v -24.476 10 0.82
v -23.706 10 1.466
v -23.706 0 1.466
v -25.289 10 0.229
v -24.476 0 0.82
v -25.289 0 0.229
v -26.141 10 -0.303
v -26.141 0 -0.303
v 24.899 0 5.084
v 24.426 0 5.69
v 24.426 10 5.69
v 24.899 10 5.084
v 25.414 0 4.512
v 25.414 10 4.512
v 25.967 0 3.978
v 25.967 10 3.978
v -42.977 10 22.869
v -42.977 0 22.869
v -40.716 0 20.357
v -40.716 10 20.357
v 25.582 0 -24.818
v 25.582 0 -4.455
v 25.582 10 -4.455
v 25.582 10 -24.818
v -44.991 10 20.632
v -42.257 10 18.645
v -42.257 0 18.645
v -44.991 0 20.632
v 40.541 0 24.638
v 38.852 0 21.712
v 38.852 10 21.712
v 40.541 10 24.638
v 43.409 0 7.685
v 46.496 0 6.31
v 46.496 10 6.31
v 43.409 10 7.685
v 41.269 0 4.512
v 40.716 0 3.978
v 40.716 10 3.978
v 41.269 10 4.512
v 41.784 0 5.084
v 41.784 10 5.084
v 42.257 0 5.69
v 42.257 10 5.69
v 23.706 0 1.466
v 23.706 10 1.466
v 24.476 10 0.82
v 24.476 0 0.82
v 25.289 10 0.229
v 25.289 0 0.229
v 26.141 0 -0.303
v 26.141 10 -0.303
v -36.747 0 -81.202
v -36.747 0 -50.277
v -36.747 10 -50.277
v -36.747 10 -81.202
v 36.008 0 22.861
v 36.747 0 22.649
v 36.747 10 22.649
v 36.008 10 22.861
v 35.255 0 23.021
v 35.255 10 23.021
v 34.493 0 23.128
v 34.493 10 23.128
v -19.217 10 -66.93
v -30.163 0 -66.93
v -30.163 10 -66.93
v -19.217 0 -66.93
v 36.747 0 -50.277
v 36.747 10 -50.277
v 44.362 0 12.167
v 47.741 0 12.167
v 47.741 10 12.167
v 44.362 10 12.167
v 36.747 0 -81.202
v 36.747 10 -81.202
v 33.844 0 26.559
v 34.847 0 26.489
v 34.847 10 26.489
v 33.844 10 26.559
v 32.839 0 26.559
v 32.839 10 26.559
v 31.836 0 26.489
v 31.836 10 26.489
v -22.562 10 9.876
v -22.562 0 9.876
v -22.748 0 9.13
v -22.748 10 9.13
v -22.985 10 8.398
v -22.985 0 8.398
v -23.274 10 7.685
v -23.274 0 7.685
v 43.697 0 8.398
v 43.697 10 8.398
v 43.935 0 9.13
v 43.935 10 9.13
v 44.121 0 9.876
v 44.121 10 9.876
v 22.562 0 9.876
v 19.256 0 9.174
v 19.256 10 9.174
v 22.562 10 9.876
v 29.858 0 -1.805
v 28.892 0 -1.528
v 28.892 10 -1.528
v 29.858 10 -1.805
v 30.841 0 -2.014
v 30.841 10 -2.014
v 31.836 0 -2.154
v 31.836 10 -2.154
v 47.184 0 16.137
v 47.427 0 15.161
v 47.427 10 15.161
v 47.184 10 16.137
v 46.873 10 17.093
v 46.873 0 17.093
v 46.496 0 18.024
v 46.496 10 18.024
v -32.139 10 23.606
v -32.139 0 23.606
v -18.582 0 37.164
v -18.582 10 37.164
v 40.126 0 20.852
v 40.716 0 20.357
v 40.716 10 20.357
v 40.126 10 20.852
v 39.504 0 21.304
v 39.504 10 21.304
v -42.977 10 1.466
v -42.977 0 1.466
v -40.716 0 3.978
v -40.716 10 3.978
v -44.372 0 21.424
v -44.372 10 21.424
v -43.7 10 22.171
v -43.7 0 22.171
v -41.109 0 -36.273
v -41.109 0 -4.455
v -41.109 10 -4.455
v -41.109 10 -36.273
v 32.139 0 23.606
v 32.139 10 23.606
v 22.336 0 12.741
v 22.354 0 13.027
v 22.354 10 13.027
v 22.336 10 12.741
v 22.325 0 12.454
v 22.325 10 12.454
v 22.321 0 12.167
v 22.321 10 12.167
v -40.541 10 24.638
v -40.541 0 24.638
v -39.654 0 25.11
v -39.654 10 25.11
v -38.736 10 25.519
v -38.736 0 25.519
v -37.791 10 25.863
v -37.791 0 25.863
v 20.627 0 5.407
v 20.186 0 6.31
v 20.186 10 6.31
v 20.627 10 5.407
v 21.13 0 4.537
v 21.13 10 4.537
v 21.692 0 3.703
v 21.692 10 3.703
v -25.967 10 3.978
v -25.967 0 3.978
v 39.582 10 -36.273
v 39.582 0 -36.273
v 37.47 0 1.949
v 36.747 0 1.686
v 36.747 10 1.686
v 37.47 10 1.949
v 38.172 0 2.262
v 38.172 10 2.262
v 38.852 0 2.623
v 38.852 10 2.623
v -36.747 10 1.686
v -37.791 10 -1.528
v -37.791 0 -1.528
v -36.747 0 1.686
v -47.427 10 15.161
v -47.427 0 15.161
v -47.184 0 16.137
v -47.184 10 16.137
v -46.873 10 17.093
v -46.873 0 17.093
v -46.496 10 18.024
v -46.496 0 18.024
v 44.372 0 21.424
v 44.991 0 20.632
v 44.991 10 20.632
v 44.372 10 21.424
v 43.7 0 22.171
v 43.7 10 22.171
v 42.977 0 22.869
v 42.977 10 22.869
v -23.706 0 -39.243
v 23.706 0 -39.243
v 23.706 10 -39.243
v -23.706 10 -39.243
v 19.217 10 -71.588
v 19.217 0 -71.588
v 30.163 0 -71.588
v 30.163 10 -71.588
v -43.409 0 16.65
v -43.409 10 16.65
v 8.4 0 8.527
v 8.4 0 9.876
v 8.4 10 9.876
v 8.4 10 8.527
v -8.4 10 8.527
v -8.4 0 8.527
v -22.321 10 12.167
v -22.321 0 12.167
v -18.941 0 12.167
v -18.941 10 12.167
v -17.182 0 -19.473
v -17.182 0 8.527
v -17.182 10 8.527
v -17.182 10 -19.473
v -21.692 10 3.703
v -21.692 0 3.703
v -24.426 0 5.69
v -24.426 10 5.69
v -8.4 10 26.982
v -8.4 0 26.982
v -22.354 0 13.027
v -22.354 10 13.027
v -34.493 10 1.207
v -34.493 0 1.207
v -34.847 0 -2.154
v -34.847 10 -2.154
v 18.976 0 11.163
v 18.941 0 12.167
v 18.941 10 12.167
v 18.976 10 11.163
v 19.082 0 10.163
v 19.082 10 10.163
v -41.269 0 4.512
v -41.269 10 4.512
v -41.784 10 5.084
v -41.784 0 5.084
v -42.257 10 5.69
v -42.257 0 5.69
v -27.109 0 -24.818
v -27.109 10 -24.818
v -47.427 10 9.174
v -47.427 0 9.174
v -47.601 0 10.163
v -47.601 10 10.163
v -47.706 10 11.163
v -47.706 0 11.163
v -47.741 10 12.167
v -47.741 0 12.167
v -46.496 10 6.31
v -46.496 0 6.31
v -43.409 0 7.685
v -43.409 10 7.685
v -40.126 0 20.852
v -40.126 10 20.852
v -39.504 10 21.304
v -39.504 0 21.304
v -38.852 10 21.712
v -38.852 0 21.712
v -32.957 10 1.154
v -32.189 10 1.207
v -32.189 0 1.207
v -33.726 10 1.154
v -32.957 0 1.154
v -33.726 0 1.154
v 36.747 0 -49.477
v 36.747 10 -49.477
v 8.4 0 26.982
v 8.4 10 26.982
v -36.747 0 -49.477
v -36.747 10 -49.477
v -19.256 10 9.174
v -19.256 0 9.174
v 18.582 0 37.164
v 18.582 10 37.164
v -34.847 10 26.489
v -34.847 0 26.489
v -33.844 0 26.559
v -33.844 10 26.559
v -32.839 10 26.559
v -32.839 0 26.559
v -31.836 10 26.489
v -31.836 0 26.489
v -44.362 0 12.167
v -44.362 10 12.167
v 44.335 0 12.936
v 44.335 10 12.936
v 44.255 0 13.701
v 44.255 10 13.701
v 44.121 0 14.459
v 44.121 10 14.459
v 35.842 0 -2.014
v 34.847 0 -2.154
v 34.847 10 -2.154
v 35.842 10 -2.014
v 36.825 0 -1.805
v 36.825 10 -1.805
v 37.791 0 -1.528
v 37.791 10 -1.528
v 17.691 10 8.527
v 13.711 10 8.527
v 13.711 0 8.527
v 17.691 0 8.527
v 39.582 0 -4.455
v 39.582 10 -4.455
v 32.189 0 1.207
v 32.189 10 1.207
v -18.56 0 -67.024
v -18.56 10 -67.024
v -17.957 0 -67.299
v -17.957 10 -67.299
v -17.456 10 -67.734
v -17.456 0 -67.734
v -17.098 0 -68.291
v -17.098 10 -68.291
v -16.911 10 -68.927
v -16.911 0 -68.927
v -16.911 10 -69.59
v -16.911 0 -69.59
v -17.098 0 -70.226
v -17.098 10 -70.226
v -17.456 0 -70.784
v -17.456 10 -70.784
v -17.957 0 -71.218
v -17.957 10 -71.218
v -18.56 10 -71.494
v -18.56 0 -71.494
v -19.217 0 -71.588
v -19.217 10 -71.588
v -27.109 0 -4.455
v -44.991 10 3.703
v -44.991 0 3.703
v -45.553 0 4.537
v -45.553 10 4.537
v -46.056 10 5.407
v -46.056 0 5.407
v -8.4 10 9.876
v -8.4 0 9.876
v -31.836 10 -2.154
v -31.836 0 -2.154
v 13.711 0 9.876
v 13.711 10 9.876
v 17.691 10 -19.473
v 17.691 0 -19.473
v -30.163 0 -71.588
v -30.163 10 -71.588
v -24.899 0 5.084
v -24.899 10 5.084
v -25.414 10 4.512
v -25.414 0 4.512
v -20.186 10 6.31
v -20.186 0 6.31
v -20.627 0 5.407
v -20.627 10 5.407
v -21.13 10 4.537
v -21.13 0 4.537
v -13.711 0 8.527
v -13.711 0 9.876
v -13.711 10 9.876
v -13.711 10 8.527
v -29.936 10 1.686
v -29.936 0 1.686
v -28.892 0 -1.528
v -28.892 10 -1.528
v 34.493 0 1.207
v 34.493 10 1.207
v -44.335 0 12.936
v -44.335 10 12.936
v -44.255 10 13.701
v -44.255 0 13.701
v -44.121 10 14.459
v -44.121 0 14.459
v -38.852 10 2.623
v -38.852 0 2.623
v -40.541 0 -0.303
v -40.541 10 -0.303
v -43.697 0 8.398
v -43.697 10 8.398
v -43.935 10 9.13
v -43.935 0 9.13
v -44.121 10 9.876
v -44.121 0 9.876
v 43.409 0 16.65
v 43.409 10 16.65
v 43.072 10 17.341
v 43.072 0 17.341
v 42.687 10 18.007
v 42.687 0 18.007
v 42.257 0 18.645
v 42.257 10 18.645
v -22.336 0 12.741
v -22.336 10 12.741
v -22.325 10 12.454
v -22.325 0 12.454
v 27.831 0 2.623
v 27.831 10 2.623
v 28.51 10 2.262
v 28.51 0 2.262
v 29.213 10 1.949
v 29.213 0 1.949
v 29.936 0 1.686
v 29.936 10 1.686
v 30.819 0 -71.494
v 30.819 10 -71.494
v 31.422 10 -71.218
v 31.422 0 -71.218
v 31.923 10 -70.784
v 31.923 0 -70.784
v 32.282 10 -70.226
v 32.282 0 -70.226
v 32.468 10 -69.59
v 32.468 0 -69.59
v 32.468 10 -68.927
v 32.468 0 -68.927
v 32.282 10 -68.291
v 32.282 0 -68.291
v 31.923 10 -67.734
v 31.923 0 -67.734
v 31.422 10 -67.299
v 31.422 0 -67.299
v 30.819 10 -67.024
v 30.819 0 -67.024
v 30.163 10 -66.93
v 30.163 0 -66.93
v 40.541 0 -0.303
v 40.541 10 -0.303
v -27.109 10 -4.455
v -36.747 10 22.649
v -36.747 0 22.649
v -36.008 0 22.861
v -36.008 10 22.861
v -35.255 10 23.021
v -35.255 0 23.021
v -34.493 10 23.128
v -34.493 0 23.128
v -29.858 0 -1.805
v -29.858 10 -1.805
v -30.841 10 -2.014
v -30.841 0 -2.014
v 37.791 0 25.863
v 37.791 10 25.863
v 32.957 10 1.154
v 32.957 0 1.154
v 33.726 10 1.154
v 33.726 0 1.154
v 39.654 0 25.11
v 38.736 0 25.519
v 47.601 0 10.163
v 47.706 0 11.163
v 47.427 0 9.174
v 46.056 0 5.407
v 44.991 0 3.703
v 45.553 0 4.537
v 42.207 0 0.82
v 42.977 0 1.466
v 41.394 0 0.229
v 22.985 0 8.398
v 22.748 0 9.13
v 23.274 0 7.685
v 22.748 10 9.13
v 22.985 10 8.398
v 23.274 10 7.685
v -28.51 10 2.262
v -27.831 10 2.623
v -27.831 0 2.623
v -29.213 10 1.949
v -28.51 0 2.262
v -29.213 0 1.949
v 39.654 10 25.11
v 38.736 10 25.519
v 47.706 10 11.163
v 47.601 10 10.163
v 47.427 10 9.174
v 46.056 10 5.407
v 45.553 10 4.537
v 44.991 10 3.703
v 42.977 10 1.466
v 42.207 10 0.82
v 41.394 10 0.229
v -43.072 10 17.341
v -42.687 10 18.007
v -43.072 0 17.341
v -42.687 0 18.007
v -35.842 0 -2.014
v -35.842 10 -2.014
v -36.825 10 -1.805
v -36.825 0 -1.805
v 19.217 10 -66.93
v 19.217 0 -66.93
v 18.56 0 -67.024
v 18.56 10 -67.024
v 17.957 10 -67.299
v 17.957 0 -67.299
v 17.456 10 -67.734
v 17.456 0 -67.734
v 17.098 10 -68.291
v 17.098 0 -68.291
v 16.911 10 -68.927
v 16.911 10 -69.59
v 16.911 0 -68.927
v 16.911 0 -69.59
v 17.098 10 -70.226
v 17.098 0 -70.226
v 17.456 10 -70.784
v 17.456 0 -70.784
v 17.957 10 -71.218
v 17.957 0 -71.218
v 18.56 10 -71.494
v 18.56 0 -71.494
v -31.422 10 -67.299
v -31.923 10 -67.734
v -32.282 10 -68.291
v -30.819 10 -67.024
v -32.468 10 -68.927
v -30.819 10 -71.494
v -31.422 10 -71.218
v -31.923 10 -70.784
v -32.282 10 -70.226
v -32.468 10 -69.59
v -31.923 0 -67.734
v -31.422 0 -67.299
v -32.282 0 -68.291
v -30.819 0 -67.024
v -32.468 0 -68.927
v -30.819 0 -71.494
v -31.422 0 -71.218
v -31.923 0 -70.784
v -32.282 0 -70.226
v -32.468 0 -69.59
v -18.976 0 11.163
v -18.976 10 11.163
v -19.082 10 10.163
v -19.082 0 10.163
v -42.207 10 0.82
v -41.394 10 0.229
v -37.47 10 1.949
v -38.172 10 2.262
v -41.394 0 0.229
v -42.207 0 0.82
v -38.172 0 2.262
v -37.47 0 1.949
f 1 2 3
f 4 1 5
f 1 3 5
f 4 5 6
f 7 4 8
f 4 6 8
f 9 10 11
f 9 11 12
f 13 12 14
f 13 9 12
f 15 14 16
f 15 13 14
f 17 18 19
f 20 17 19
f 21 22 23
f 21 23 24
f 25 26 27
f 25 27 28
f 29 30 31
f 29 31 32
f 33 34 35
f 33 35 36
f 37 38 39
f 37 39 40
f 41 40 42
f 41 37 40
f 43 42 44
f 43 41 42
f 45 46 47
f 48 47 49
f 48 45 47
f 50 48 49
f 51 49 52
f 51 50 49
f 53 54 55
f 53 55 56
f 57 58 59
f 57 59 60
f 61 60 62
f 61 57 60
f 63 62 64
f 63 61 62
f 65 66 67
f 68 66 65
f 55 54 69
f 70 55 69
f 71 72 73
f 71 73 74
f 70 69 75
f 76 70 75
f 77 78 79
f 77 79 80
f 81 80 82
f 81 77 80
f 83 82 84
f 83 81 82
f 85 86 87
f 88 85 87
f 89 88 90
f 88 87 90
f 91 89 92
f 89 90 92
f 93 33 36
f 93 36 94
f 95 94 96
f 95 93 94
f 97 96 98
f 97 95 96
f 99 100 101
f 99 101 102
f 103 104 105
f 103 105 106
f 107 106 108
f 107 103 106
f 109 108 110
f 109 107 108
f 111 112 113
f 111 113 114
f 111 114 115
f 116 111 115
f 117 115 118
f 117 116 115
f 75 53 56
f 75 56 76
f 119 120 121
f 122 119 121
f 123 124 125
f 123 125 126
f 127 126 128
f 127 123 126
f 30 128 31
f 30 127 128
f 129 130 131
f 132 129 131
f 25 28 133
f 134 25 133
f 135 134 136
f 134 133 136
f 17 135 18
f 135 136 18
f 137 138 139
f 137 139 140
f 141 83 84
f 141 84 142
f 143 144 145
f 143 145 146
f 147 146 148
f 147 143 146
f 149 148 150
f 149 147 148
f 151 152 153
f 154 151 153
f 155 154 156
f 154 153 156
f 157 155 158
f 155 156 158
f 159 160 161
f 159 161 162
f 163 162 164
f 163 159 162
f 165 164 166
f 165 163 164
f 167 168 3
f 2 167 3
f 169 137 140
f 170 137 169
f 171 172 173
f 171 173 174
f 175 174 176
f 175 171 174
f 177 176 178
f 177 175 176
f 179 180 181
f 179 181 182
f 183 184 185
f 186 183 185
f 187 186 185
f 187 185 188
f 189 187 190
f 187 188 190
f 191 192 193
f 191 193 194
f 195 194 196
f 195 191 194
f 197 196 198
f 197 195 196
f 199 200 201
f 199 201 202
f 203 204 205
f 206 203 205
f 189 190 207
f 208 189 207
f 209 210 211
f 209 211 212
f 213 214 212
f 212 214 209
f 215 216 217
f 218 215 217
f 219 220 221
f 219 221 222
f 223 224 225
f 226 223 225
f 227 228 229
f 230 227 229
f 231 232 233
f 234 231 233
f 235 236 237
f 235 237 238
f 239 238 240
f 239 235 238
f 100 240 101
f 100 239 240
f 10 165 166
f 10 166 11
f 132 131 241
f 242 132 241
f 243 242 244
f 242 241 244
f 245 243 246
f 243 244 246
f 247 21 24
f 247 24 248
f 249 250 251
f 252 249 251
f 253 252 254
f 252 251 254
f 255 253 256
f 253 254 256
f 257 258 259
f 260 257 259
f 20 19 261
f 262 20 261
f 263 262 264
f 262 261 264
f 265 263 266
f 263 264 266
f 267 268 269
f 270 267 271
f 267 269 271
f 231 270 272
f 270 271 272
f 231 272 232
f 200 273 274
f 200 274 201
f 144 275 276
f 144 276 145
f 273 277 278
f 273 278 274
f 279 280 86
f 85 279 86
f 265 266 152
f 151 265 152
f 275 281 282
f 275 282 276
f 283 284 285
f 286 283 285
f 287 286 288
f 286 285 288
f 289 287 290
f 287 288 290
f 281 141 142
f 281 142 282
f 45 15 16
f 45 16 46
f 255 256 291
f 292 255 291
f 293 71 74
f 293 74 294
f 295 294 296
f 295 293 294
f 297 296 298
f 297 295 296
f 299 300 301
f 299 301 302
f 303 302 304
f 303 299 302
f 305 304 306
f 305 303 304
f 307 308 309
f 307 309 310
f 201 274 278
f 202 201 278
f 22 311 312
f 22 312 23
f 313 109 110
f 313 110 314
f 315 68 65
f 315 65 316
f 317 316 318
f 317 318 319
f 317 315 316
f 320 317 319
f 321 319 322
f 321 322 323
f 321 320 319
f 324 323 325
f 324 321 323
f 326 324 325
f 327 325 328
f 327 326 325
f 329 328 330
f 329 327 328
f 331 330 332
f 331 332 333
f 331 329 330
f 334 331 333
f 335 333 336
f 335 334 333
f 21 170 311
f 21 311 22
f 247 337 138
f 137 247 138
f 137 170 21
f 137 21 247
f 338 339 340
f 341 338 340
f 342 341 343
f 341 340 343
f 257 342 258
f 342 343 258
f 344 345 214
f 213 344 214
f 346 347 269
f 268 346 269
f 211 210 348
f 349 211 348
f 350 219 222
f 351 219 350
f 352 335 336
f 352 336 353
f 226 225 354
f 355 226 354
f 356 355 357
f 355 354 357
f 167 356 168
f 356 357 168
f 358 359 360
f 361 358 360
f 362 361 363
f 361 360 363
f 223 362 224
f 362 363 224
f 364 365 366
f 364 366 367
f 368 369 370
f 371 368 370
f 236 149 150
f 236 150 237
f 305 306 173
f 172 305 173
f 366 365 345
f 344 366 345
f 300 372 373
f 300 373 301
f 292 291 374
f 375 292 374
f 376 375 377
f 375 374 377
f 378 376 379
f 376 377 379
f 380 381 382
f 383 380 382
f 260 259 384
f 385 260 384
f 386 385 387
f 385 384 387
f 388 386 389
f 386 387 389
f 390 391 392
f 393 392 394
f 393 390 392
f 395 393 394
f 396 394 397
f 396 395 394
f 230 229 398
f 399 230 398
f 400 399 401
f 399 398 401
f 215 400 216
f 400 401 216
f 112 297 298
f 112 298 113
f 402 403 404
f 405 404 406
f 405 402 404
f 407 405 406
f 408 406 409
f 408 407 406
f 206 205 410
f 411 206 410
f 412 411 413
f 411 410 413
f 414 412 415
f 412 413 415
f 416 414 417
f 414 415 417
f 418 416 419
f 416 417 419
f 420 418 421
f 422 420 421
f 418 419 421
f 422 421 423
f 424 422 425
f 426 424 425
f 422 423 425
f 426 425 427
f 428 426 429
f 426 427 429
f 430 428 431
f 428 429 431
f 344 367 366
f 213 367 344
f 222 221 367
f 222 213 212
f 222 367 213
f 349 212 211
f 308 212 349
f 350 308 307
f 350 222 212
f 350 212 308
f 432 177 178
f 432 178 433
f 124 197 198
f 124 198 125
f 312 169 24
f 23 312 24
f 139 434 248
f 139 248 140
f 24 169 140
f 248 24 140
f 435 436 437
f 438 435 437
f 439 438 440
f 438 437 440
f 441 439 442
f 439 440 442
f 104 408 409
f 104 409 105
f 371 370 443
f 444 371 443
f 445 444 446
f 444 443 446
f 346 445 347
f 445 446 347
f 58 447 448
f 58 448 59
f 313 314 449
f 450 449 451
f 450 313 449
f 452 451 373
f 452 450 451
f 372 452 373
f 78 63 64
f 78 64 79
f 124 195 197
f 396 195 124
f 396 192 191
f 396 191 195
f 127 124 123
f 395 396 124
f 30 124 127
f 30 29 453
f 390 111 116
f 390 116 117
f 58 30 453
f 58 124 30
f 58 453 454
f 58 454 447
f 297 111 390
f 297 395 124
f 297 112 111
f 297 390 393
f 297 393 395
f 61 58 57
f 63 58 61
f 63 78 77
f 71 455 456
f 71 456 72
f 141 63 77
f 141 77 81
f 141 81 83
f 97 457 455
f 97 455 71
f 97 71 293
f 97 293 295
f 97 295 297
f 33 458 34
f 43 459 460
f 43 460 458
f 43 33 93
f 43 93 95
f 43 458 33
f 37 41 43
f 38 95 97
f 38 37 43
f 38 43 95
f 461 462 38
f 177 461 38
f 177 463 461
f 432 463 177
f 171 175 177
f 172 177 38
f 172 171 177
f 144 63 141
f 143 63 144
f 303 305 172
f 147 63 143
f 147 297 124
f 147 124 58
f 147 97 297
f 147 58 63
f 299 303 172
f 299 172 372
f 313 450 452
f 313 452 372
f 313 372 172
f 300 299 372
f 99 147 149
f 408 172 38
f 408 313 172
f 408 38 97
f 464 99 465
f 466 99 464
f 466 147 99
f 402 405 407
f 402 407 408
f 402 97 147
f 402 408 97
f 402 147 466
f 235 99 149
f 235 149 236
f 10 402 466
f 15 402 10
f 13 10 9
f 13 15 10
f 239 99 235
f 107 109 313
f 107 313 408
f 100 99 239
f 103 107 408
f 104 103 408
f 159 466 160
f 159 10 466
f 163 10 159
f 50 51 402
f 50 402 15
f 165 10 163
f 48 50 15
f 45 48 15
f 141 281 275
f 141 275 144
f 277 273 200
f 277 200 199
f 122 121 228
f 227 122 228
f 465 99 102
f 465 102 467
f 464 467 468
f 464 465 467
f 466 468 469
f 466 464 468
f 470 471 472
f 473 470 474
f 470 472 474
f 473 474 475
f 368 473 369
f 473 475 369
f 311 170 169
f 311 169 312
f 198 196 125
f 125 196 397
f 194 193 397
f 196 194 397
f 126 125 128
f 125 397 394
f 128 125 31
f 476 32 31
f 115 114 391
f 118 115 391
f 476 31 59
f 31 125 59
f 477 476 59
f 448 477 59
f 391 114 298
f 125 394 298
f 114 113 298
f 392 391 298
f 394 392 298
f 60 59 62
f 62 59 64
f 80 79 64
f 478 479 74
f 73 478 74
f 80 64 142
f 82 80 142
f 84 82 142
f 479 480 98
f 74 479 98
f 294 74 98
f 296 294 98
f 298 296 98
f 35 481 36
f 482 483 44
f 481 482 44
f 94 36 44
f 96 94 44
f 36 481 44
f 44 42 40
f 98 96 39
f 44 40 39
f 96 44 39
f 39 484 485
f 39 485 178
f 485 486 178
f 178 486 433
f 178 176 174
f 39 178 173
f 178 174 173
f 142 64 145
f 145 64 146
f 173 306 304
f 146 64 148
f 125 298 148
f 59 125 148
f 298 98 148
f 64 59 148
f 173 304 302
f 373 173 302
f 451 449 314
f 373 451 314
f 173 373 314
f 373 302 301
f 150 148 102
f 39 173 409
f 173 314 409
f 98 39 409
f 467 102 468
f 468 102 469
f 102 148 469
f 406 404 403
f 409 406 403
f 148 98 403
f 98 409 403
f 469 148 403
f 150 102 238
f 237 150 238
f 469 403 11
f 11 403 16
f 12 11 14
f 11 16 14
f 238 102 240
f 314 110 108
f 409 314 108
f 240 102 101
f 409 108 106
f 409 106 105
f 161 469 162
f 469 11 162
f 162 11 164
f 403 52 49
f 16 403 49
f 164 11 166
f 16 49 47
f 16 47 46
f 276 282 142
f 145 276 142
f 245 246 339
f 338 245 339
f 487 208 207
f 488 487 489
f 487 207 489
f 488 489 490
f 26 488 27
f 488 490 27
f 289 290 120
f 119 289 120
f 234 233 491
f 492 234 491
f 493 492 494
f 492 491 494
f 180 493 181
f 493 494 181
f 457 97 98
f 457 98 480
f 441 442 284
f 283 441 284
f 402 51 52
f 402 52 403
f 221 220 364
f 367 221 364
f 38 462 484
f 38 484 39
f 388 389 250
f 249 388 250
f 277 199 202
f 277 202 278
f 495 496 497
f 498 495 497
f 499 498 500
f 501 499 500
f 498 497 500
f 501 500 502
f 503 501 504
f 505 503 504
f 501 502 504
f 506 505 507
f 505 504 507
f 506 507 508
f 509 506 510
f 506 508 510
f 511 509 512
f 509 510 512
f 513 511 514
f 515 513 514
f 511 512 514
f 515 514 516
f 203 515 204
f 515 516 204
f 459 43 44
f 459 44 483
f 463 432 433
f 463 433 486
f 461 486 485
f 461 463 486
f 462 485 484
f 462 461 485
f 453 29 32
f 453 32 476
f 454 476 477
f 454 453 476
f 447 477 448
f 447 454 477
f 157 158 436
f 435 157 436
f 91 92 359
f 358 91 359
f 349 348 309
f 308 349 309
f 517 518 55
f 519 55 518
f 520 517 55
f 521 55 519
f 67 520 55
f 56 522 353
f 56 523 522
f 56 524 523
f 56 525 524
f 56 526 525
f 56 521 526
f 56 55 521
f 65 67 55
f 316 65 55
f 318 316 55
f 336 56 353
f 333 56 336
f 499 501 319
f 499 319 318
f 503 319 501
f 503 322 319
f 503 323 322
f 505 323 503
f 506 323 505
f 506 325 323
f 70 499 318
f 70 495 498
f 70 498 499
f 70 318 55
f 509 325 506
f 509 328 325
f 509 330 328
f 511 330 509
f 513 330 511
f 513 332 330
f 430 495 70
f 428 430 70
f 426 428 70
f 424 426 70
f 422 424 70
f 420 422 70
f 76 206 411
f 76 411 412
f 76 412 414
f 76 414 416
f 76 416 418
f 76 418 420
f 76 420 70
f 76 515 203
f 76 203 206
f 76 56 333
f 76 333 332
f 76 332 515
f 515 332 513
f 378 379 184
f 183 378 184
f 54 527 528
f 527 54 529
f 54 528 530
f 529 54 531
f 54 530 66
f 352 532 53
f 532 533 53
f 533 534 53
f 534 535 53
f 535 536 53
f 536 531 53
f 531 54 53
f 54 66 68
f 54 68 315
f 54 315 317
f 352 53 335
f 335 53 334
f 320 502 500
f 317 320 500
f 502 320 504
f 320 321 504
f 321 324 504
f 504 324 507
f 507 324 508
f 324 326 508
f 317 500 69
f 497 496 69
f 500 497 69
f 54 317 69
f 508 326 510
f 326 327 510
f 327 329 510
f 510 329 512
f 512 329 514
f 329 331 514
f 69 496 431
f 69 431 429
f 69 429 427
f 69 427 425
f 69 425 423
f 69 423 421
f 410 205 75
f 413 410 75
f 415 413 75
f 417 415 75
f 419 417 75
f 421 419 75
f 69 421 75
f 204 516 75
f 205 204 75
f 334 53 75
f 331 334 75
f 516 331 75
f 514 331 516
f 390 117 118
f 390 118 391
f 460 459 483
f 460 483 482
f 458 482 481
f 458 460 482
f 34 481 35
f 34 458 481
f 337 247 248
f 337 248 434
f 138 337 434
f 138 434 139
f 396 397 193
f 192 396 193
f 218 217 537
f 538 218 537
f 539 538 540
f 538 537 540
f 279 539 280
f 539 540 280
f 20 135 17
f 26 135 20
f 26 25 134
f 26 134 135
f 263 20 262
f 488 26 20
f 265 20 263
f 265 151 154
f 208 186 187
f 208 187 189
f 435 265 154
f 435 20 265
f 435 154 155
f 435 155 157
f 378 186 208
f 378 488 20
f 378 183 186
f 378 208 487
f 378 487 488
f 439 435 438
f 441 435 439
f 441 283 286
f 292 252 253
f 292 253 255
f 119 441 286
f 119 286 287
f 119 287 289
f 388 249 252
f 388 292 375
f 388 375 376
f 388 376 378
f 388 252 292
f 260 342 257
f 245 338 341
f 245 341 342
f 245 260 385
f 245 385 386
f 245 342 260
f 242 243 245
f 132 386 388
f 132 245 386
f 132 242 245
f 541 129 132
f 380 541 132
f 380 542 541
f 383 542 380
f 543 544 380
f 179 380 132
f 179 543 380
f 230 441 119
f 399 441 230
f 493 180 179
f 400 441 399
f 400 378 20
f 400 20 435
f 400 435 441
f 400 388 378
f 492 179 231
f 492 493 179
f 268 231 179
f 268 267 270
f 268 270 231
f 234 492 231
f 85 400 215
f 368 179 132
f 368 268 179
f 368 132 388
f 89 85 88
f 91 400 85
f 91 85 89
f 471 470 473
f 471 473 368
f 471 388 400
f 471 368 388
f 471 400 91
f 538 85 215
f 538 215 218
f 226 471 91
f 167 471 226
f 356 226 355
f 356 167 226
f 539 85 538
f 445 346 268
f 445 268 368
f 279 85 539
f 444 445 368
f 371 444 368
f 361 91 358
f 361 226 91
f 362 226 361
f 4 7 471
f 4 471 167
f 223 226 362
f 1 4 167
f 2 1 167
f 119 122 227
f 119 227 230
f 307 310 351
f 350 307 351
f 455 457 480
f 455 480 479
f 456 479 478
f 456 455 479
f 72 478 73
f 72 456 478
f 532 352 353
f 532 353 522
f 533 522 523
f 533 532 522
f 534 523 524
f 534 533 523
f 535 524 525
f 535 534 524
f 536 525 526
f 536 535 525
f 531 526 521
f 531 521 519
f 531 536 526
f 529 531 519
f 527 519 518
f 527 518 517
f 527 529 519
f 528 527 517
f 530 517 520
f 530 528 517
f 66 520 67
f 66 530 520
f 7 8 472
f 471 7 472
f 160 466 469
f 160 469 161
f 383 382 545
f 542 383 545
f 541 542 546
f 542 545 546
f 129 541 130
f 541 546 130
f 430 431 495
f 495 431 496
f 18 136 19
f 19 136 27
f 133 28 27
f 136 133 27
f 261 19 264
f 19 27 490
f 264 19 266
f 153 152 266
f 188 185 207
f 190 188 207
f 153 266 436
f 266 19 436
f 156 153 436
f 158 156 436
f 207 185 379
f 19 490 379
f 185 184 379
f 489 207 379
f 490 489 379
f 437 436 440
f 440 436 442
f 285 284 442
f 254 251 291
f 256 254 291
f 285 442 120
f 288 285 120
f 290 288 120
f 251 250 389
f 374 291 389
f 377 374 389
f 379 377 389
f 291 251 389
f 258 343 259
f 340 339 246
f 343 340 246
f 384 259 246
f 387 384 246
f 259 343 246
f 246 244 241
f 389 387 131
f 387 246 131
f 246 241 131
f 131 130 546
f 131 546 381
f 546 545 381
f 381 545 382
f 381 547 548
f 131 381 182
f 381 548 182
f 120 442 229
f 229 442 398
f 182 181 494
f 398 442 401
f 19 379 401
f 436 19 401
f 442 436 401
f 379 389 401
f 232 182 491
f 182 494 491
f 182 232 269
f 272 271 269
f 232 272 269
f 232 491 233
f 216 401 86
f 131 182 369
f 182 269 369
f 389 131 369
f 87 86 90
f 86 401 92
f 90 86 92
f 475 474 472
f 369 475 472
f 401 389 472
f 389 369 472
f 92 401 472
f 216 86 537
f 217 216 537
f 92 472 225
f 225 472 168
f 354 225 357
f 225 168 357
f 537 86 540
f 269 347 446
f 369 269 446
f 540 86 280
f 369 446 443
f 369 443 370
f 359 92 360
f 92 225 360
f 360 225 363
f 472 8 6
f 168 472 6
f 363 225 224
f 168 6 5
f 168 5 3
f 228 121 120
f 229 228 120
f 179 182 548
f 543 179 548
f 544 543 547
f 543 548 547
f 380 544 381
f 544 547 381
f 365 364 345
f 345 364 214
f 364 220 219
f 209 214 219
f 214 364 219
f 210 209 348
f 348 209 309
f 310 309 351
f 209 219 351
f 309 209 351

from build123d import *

# Parameters (mm, degrees)
SKETCH1_W           = 34.872727273
SKETCH1_H           = 28
SKETCH1_W_2         = 73.493872484
SKETCH1_H_2         = 30.925305247
SKETCH1_W_3         = 5.310911144
SKETCH1_H_3         = 1.348863037
BOSS_EXTRUDE1_DEPTH = 10


with BuildPart() as part:
    # Sketch1 → Boss-Extrude1 (new body)
    with BuildSketch(Plane(origin=(0, 0, 0), x_dir=(1, 0, 0), z_dir=(0, 1, 0))):
        with BuildLine():
            Line((-23.273628157, -7.68497585), (-20.186345058, -6.310428855))
            ThreePointArc((-20.186345058, -6.310428855), (-20.870633833, -4.967436515), (-21.691554929, -3.703328882))
            Line((-21.691554929, -3.703328882), (-24.425589095, -5.689720977))
            ThreePointArc((-24.425589095, -5.689720977), (-25.151536489, -4.793250604), (-25.967213737, -3.977573356))
            Line((-25.967213737, -3.977573356), (-23.705918916, -1.466151028))
            ThreePointArc((-23.705918916, -1.466151028), (-24.877292015, -0.517591796), (-26.141399648, 0.303329299))
            Line((-26.141399648, 0.303329299), (-27.831125689, -2.623362055))
            ThreePointArc((-27.831125689, -2.623362055), (-28.858938983, -2.099665024), (-29.935863054, -1.686272605))
            Line((-29.935863054, -1.686272605), (-28.891554929, 1.52777732))
            ThreePointArc((-28.891554929, 1.52777732), (-30.3474713, 1.917888936), (-31.836189777, 2.153678778))
            Line((-31.836189777, 2.153678778), (-32.18943871, -1.207260312))
            ThreePointArc((-32.18943871, -1.207260312), (-33.341399648, -1.146888597), (-34.493360586, -1.207260312))
            Line((-34.493360586, -1.207260312), (-34.846609519, 2.153678778))
            ThreePointArc((-34.846609519, 2.153678778), (-36.335327996, 1.917888936), (-37.791244367, 1.52777732))
            Line((-37.791244367, 1.52777732), (-36.746936242, -1.686272605))
            ThreePointArc((-36.746936242, -1.686272605), (-37.823860313, -2.099665024), (-38.851673607, -2.623362055))
            Line((-38.851673607, -2.623362055), (-40.541399648, 0.303329299))
            ThreePointArc((-40.541399648, 0.303329299), (-41.805507281, -0.517591796), (-42.976880379, -1.466151028))
            Line((-42.976880379, -1.466151028), (-40.715585558, -3.977573356))
            ThreePointArc((-40.715585558, -3.977573356), (-41.531262807, -4.793250604), (-42.257210201, -5.689720977))
            Line((-42.257210201, -5.689720977), (-44.991244367, -3.703328882))
            ThreePointArc((-44.991244367, -3.703328882), (-45.812165462, -4.967436515), (-46.496454238, -6.310428855))
            Line((-46.496454238, -6.310428855), (-43.409171139, -7.68497585))
            ThreePointArc((-43.409171139, -7.68497585), (-43.822563558, -8.761899921), (-44.121122152, -9.876135764))
            Line((-44.121122152, -9.876135764), (-47.426725098, -9.173508167))
            ThreePointArc((-47.426725098, -9.173508167), (-47.662514941, -10.662226644), (-47.741399648, -12.167436515))
            Line((-47.741399648, -12.167436515), (-44.361947566, -12.167436515))
            ThreePointArc((-44.361947566, -12.167436515), (-44.301575851, -13.319397453), (-44.121122152, -14.458737266))
            Line((-44.121122152, -14.458737266), (-47.426725098, -15.161364863))
            ThreePointArc((-47.426725098, -15.161364863), (-47.036613482, -16.617281234), (-46.496454238, -18.024444175))
            Line((-46.496454238, -18.024444175), (-43.409171139, -16.64989718))
            ThreePointArc((-43.409171139, -16.64989718), (-42.885474108, -17.677710474), (-42.257210201, -18.645152053))
            Line((-42.257210201, -18.645152053), (-44.991244367, -20.631544148))
            ThreePointArc((-44.991244367, -20.631544148), (-44.042685135, -21.802917247), (-42.976880379, -22.868722002))
            Line((-42.976880379, -22.868722002), (-40.715585558, -20.357299674))
            ThreePointArc((-40.715585558, -20.357299674), (-39.819115186, -21.083247068), (-38.851673607, -21.711510975))
            Line((-38.851673607, -21.711510975), (-40.541399648, -24.63820233))
            ThreePointArc((-40.541399648, -24.63820233), (-39.198407308, -25.322491105), (-37.791244367, -25.86265035))
            Line((-37.791244367, -25.86265035), (-36.746936242, -22.648600425))
            ThreePointArc((-36.746936242, -22.648600425), (-35.632700399, -22.94715902), (-34.493360586, -23.127612718))
            Line((-34.493360586, -23.127612718), (-34.846609519, -26.488551808))
            ThreePointArc((-34.846609519, -26.488551808), (-33.341399648, -26.567436515), (-31.836189777, -26.488551808))
            Line((-31.836189777, -26.488551808), (-32.139123373, -23.606331173))
            Line((-32.139123373, -23.606331173), (-18.581818182, -37.163636364))
            Line((-18.581818182, -37.163636364), (-8.4, -26.981818182))
            Line((-8.4, -26.981818182), (-22.354452896, -13.027365285))
            ThreePointArc((-22.354452896, -13.027365285), (-22.329255226, -12.597729011), (-22.32085173, -12.167436515))
            Line((-22.32085173, -12.167436515), (-18.941399648, -12.167436515))
            ThreePointArc((-18.941399648, -12.167436515), (-19.020284355, -10.662226644), (-19.256074197, -9.173508167))
            Line((-19.256074197, -9.173508167), (-22.561677143, -9.876135764))
            ThreePointArc((-22.561677143, -9.876135764), (-22.860235737, -8.761899921), (-23.273628157, -7.68497585))
        make_face()
        with BuildLine():
            ThreePointArc((18.941399648, -12.167436515), (19.020284355, -10.662226644), (19.256074197, -9.173508167))
            Line((19.256074197, -9.173508167), (22.561677143, -9.876135764))
            ThreePointArc((22.561677143, -9.876135764), (22.860235737, -8.761899921), (23.273628157, -7.68497585))
            Line((23.273628157, -7.68497585), (20.186345058, -6.310428855))
            ThreePointArc((20.186345058, -6.310428855), (20.870633833, -4.967436515), (21.691554929, -3.703328882))
            Line((21.691554929, -3.703328882), (24.425589095, -5.689720977))
            ThreePointArc((24.425589095, -5.689720977), (25.151536489, -4.793250604), (25.967213737, -3.977573356))
            Line((25.967213737, -3.977573356), (23.705918916, -1.466151028))
            ThreePointArc((23.705918916, -1.466151028), (24.877292015, -0.517591796), (26.141399648, 0.303329299))
            Line((26.141399648, 0.303329299), (27.831125689, -2.623362055))
            ThreePointArc((27.831125689, -2.623362055), (28.858938983, -2.099665024), (29.935863054, -1.686272605))
            Line((29.935863054, -1.686272605), (28.891554929, 1.52777732))
            ThreePointArc((28.891554929, 1.52777732), (30.3474713, 1.917888936), (31.836189777, 2.153678778))
            Line((31.836189777, 2.153678778), (32.18943871, -1.207260312))
            ThreePointArc((32.18943871, -1.207260312), (33.341399648, -1.146888597), (34.493360586, -1.207260312))
            Line((34.493360586, -1.207260312), (34.846609519, 2.153678778))
            ThreePointArc((34.846609519, 2.153678778), (36.335327996, 1.917888936), (37.791244367, 1.52777732))
            Line((37.791244367, 1.52777732), (36.746936242, -1.686272605))
            ThreePointArc((36.746936242, -1.686272605), (37.823860313, -2.099665024), (38.851673607, -2.623362055))
            Line((38.851673607, -2.623362055), (40.541399648, 0.303329299))
            ThreePointArc((40.541399648, 0.303329299), (41.805507281, -0.517591796), (42.976880379, -1.466151028))
            Line((42.976880379, -1.466151028), (40.715585558, -3.977573356))
            ThreePointArc((40.715585558, -3.977573356), (41.531262807, -4.793250604), (42.257210201, -5.689720977))
            Line((42.257210201, -5.689720977), (44.991244367, -3.703328882))
            ThreePointArc((44.991244367, -3.703328882), (45.812165462, -4.967436515), (46.496454238, -6.310428855))
            Line((46.496454238, -6.310428855), (43.409171139, -7.68497585))
            ThreePointArc((43.409171139, -7.68497585), (43.822563558, -8.761899921), (44.121122152, -9.876135764))
            Line((44.121122152, -9.876135764), (47.426725098, -9.173508167))
            ThreePointArc((47.426725098, -9.173508167), (47.662514941, -10.662226644), (47.741399648, -12.167436515))
            Line((47.741399648, -12.167436515), (44.361947566, -12.167436515))
            ThreePointArc((44.361947566, -12.167436515), (44.301575851, -13.319397453), (44.121122152, -14.458737266))
            Line((44.121122152, -14.458737266), (47.426725098, -15.161364863))
            ThreePointArc((47.426725098, -15.161364863), (47.036613482, -16.617281234), (46.496454238, -18.024444175))
            Line((46.496454238, -18.024444175), (43.409171139, -16.64989718))
            ThreePointArc((43.409171139, -16.64989718), (42.885474108, -17.677710474), (42.257210201, -18.645152053))
            Line((42.257210201, -18.645152053), (44.991244367, -20.631544148))
            ThreePointArc((44.991244367, -20.631544148), (44.042685135, -21.802917247), (42.976880379, -22.868722002))
            Line((42.976880379, -22.868722002), (40.715585558, -20.357299674))
            ThreePointArc((40.715585558, -20.357299674), (39.819115186, -21.083247068), (38.851673607, -21.711510975))
            Line((38.851673607, -21.711510975), (40.541399648, -24.63820233))
            ThreePointArc((40.541399648, -24.63820233), (39.198407308, -25.322491105), (37.791244367, -25.86265035))
            Line((37.791244367, -25.86265035), (36.746936242, -22.648600425))
            ThreePointArc((36.746936242, -22.648600425), (35.632700399, -22.94715902), (34.493360586, -23.127612718))
            Line((34.493360586, -23.127612718), (34.846609519, -26.488551808))
            ThreePointArc((34.846609519, -26.488551808), (33.341399648, -26.567436515), (31.836189777, -26.488551808))
            Line((31.836189777, -26.488551808), (32.139123373, -23.606331173))
            Line((32.139123373, -23.606331173), (18.581818182, -37.163636364))
            Line((18.581818182, -37.163636364), (8.4, -26.981818182))
            Line((8.4, -26.981818182), (22.354452896, -13.027365285))
            ThreePointArc((22.354452896, -13.027365285), (22.329255226, -12.597729011), (22.32085173, -12.167436515))
            Line((22.32085173, -12.167436515), (18.941399648, -12.167436515))
        make_face()
        with Locations((0.254545455, 5.472727273)):
            Rectangle(SKETCH1_W, SKETCH1_H)
        Polygon((-27.109090909, 4.454545455), (-41.109090909, 4.454545455), (-41.109090909, 36.272727273), (39.581818182, 36.272727273), (39.581818182, 4.454545455), (25.581818182, 4.454545455), (25.581818182, 24.818181818), (-27.109090909, 24.818181818), align=None)
        Polygon((23.705918916, 39.242717593), (-23.705918916, 39.242717593), (-36.746936242, 49.476854674), (36.746936242, 49.476854674), align=None)
        with Locations((0, 65.739350238)):
            Rectangle(SKETCH1_W_2, SKETCH1_H_2)
        with BuildLine():
            ThreePointArc((-19.21660374, 66.929718355), (-16.887413584, 69.258908511), (-19.21660374, 71.588098667))
            Line((-19.21660374, 71.588098667), (-30.162795949, 71.588098667))
            ThreePointArc((-30.162795949, 71.588098667), (-32.491986105, 69.258908511), (-30.162795949, 66.929718355))
            Line((-30.162795949, 66.929718355), (-19.21660374, 66.929718355))
        make_face(mode=Mode.SUBTRACT)
        with BuildLine():
            Line((30.162795949, 66.929718355), (19.21660374, 66.929718355))
            ThreePointArc((19.21660374, 66.929718355), (16.887413584, 69.258908511), (19.21660374, 71.588098667))
            Line((19.21660374, 71.588098667), (30.162795949, 71.588098667))
            ThreePointArc((30.162795949, 71.588098667), (32.491986105, 69.258908511), (30.162795949, 66.929718355))
        make_face(mode=Mode.SUBTRACT)
        with Locations((-11.055455572, -9.201704246)):
            Rectangle(SKETCH1_W_3, SKETCH1_H_3)
        with Locations((11.055455572, -9.201704246)):
            Rectangle(SKETCH1_W_3, SKETCH1_H_3)
    extrude(amount=BOSS_EXTRUDE1_DEPTH)


solid = part.part
